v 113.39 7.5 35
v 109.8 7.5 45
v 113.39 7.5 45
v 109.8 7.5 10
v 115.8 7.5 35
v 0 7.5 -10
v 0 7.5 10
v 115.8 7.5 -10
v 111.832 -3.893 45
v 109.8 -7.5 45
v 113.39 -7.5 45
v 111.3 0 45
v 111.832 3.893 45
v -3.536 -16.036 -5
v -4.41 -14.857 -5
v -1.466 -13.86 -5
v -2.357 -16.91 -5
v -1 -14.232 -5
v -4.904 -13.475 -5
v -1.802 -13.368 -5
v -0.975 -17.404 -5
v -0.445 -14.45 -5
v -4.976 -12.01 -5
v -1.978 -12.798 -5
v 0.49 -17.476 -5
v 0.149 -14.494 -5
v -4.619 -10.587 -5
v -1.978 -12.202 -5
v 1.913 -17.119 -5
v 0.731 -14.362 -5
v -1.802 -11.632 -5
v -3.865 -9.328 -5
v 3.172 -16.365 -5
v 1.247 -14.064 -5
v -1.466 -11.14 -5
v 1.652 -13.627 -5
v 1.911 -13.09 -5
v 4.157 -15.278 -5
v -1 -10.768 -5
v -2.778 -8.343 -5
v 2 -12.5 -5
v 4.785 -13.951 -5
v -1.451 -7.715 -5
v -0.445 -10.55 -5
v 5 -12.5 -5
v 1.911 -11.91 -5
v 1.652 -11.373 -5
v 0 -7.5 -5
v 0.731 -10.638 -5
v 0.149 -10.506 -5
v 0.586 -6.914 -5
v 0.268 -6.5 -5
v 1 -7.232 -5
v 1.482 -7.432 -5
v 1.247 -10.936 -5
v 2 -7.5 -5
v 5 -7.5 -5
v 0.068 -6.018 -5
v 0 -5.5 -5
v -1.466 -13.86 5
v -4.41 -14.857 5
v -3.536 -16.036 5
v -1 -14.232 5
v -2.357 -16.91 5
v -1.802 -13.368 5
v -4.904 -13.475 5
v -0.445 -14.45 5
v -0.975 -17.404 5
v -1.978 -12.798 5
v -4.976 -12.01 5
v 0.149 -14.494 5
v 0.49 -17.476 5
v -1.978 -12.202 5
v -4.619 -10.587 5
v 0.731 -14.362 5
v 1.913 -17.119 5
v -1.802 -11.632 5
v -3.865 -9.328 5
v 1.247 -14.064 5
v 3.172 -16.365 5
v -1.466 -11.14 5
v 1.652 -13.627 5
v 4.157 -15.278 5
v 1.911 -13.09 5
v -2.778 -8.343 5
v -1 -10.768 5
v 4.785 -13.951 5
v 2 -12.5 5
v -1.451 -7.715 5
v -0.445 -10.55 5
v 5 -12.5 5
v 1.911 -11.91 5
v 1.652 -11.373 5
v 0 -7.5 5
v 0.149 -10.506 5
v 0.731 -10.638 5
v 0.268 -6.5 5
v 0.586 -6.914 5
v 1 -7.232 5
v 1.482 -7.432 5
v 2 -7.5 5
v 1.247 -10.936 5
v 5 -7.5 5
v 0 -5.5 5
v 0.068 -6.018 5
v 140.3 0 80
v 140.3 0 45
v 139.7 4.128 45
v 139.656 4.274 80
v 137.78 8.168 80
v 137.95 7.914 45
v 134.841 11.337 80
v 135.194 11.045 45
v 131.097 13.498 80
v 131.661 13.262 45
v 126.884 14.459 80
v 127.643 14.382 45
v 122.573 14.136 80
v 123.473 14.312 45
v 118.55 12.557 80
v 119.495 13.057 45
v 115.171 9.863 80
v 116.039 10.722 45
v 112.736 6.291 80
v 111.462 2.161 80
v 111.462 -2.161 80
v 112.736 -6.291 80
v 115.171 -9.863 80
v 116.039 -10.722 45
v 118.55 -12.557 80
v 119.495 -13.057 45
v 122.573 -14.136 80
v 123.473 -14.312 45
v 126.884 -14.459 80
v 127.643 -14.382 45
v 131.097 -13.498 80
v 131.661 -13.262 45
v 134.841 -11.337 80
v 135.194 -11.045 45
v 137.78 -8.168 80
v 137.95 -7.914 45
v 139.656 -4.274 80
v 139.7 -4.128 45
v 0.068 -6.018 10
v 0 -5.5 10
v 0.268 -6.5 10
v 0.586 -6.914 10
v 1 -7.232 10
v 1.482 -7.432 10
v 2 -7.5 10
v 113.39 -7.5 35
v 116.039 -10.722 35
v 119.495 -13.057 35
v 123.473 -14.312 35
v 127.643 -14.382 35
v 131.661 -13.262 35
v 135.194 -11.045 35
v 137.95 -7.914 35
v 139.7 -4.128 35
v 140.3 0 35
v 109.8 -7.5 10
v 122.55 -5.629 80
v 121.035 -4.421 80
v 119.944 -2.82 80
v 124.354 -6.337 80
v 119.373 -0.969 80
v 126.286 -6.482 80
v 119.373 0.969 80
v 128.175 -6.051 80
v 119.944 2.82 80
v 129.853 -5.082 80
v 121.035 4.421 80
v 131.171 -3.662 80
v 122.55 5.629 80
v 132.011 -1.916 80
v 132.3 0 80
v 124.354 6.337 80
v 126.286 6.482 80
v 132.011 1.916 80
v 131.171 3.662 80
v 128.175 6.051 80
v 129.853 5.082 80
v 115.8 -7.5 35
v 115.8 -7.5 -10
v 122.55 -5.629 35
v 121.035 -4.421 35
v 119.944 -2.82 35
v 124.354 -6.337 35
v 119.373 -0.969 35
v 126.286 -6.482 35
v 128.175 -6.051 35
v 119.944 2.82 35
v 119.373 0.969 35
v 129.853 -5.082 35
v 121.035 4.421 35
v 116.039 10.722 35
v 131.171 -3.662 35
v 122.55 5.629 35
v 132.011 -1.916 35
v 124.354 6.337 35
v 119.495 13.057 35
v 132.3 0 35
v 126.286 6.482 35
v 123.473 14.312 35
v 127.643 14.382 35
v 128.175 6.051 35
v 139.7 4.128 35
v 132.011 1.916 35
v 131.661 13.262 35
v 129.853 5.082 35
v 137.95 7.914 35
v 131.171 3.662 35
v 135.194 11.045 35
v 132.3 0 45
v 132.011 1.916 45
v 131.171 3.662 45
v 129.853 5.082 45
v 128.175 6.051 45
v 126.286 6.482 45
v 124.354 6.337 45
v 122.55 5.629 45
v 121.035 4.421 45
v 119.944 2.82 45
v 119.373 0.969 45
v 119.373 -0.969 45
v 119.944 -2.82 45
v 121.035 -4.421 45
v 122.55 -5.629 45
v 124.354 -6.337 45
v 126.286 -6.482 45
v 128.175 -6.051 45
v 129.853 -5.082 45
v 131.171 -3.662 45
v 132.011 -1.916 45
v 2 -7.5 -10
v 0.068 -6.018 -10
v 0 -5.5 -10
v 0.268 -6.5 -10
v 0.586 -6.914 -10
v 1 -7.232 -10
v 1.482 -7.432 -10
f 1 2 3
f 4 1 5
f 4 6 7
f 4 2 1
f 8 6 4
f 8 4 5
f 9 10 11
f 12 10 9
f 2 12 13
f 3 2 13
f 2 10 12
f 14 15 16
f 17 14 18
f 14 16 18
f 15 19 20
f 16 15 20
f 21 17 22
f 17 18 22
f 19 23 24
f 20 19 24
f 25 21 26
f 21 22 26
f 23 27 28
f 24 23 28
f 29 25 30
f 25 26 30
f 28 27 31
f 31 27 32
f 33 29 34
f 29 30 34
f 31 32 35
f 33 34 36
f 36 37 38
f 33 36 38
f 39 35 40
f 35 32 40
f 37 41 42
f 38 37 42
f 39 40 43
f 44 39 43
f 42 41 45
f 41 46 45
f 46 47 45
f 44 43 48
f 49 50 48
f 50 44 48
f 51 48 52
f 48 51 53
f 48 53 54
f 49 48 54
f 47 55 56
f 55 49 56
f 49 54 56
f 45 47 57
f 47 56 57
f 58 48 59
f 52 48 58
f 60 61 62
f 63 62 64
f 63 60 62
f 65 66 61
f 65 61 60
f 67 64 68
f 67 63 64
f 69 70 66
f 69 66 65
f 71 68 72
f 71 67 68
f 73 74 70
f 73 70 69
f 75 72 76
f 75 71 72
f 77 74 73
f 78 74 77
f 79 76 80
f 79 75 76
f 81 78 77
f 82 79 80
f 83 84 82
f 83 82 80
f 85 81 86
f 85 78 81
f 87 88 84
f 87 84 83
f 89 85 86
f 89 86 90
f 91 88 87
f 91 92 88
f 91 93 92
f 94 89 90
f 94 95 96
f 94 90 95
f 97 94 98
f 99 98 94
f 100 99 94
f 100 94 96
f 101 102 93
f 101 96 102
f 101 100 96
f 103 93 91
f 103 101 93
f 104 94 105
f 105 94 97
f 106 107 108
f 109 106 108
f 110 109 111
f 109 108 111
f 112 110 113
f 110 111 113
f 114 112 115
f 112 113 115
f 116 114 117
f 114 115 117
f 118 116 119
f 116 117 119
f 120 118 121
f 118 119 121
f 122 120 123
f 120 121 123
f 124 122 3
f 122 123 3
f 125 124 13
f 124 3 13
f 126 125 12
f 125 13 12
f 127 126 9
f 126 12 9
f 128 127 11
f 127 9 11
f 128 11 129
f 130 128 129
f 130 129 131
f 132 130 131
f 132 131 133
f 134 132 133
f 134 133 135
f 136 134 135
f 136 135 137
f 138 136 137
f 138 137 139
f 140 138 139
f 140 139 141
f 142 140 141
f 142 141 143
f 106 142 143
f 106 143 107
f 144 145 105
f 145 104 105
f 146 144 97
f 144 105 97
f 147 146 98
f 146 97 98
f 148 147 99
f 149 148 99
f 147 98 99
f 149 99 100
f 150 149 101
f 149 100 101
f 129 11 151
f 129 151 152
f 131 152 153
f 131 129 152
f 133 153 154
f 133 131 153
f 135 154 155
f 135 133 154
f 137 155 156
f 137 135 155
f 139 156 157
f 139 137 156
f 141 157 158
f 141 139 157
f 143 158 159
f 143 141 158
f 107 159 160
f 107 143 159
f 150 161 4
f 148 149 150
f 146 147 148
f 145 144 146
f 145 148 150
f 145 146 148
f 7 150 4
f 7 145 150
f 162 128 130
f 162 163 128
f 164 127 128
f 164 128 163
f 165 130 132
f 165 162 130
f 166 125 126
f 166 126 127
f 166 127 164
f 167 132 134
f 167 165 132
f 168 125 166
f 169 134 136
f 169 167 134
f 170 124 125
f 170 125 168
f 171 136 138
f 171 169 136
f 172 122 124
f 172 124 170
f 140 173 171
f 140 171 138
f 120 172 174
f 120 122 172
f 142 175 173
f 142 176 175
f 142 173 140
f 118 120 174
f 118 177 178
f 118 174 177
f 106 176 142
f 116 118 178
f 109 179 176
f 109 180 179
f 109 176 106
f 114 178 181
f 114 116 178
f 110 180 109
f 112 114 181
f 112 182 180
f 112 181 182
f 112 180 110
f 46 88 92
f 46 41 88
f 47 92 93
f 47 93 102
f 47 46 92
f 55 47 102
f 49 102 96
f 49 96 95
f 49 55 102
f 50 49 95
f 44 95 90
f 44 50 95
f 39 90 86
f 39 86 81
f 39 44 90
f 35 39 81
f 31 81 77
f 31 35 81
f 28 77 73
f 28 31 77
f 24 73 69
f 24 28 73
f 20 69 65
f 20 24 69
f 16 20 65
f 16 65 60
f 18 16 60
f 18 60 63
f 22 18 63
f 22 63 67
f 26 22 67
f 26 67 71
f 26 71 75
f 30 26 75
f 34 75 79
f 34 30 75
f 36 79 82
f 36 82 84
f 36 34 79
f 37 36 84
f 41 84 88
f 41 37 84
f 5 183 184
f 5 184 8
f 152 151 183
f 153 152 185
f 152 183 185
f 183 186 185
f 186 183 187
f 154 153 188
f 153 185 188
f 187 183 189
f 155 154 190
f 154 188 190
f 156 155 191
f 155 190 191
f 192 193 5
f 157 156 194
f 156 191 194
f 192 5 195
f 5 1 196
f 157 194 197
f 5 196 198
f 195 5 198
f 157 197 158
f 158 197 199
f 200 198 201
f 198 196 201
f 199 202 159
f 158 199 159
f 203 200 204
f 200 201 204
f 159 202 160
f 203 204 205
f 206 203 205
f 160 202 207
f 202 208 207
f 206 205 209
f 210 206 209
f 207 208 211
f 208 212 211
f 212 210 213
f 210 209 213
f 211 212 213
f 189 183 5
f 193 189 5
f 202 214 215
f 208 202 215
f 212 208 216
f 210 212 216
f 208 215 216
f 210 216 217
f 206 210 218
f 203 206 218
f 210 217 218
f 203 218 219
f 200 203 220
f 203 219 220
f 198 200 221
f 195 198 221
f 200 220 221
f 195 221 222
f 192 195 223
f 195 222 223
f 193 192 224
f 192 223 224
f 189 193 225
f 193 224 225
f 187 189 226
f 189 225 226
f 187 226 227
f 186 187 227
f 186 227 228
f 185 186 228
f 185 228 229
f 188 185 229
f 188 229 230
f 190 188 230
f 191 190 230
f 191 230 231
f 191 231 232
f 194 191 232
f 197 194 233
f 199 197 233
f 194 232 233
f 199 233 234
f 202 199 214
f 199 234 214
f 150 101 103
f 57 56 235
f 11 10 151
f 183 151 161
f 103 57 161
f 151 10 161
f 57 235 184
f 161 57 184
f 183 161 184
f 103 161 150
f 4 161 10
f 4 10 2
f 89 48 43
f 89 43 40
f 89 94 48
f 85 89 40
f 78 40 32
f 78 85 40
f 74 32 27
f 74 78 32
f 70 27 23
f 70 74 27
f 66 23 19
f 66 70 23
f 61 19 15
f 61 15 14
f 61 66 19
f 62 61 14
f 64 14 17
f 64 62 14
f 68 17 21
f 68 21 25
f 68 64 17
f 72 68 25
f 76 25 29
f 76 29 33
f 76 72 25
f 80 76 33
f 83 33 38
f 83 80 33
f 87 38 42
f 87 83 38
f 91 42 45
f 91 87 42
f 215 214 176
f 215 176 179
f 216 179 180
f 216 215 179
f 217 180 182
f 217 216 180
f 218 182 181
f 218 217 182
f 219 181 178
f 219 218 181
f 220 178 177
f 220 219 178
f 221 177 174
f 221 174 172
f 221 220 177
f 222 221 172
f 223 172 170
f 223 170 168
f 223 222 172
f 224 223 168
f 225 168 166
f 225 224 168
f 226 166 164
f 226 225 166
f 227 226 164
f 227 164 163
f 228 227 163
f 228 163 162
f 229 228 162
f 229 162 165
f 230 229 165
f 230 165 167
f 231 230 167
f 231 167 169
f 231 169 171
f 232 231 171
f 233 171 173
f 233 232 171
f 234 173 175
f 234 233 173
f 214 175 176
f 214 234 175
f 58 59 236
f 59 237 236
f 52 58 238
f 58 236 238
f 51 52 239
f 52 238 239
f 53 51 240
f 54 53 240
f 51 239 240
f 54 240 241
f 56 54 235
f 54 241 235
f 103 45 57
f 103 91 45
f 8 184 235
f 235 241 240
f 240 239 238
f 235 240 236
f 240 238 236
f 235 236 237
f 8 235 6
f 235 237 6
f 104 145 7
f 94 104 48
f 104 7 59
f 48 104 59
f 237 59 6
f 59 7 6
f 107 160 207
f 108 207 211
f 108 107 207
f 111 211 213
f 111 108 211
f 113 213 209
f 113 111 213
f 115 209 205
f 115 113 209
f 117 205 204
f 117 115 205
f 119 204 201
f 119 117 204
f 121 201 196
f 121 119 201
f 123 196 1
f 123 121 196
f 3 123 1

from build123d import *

# Parameters (mm, degrees)
SKETCH4_W                = 20
SKETCH4_H                = 15
BOSS_EXTRUDE1_DEPTH      = 115.8
SKETCH5_W                = 6
SKETCH5_H                = 15
BOSS_EXTRUDE2_DEPTH      = 35
SKETCH6_R                = 14.5
SKETCH6_R_2              = 6.5
BOSS_EXTRUDE3_DEPTH      = 35
BOSS_EXTRUDE3_DEPTH_BACK = 10
SKETCH7_R                = 2
BOSS_EXTRUDE4_DEPTH      = 5
FILLET1_R                = 2


with BuildPart() as part:
    # Sketch4 → Boss-Extrude1 (new body)
    with BuildSketch(Plane(origin=(0, 0, 0), x_dir=(0, 0, -1), z_dir=(1, 0, 0))):
        Rectangle(SKETCH4_W, SKETCH4_H)
    extrude(amount=BOSS_EXTRUDE1_DEPTH)

    # Sketch5 → Boss-Extrude2 (add)
    with BuildSketch(Plane.XY.offset(10)):
        with Locations((112.8, 0)):
            Rectangle(SKETCH5_W, SKETCH5_H)
    extrude(amount=BOSS_EXTRUDE2_DEPTH)

    # Sketch6 → Boss-Extrude3 (add, two sides)
    with BuildSketch(Plane.XY.offset(45)) as boss_extrude3_sk:
        with Locations((125.8, 0)):
            Circle(SKETCH6_R)
        with Locations((125.8, 0)):
            Circle(SKETCH6_R_2, mode=Mode.SUBTRACT)
    extrude(amount=BOSS_EXTRUDE3_DEPTH)
    extrude(boss_extrude3_sk.sketch, amount=-BOSS_EXTRUDE3_DEPTH_BACK)

    # Sketch7 → Boss-Extrude4 (add, symmetric)
    with BuildSketch(Plane.XY):
        with BuildLine():
            Line((5, -12.5), (5, -7.5))
            Line((5, -7.5), (0, -7.5))
            ThreePointArc((0, -7.5), (-3.535533906, -16.035533906), (5, -12.5))
        make_face()
        with Locations((0, -12.5)):
            Circle(SKETCH7_R, mode=Mode.SUBTRACT)
    extrude(amount=BOSS_EXTRUDE4_DEPTH, both=True)

    # Fillet1
    fillet1_edges = [part.edges().sort_by_distance(p)[0] for p in [
        (0, -7.5, -7.5),
        (0, -7.5, 7.5),
    ]]
    fillet(fillet1_edges, radius=FILLET1_R)


solid = part.part
